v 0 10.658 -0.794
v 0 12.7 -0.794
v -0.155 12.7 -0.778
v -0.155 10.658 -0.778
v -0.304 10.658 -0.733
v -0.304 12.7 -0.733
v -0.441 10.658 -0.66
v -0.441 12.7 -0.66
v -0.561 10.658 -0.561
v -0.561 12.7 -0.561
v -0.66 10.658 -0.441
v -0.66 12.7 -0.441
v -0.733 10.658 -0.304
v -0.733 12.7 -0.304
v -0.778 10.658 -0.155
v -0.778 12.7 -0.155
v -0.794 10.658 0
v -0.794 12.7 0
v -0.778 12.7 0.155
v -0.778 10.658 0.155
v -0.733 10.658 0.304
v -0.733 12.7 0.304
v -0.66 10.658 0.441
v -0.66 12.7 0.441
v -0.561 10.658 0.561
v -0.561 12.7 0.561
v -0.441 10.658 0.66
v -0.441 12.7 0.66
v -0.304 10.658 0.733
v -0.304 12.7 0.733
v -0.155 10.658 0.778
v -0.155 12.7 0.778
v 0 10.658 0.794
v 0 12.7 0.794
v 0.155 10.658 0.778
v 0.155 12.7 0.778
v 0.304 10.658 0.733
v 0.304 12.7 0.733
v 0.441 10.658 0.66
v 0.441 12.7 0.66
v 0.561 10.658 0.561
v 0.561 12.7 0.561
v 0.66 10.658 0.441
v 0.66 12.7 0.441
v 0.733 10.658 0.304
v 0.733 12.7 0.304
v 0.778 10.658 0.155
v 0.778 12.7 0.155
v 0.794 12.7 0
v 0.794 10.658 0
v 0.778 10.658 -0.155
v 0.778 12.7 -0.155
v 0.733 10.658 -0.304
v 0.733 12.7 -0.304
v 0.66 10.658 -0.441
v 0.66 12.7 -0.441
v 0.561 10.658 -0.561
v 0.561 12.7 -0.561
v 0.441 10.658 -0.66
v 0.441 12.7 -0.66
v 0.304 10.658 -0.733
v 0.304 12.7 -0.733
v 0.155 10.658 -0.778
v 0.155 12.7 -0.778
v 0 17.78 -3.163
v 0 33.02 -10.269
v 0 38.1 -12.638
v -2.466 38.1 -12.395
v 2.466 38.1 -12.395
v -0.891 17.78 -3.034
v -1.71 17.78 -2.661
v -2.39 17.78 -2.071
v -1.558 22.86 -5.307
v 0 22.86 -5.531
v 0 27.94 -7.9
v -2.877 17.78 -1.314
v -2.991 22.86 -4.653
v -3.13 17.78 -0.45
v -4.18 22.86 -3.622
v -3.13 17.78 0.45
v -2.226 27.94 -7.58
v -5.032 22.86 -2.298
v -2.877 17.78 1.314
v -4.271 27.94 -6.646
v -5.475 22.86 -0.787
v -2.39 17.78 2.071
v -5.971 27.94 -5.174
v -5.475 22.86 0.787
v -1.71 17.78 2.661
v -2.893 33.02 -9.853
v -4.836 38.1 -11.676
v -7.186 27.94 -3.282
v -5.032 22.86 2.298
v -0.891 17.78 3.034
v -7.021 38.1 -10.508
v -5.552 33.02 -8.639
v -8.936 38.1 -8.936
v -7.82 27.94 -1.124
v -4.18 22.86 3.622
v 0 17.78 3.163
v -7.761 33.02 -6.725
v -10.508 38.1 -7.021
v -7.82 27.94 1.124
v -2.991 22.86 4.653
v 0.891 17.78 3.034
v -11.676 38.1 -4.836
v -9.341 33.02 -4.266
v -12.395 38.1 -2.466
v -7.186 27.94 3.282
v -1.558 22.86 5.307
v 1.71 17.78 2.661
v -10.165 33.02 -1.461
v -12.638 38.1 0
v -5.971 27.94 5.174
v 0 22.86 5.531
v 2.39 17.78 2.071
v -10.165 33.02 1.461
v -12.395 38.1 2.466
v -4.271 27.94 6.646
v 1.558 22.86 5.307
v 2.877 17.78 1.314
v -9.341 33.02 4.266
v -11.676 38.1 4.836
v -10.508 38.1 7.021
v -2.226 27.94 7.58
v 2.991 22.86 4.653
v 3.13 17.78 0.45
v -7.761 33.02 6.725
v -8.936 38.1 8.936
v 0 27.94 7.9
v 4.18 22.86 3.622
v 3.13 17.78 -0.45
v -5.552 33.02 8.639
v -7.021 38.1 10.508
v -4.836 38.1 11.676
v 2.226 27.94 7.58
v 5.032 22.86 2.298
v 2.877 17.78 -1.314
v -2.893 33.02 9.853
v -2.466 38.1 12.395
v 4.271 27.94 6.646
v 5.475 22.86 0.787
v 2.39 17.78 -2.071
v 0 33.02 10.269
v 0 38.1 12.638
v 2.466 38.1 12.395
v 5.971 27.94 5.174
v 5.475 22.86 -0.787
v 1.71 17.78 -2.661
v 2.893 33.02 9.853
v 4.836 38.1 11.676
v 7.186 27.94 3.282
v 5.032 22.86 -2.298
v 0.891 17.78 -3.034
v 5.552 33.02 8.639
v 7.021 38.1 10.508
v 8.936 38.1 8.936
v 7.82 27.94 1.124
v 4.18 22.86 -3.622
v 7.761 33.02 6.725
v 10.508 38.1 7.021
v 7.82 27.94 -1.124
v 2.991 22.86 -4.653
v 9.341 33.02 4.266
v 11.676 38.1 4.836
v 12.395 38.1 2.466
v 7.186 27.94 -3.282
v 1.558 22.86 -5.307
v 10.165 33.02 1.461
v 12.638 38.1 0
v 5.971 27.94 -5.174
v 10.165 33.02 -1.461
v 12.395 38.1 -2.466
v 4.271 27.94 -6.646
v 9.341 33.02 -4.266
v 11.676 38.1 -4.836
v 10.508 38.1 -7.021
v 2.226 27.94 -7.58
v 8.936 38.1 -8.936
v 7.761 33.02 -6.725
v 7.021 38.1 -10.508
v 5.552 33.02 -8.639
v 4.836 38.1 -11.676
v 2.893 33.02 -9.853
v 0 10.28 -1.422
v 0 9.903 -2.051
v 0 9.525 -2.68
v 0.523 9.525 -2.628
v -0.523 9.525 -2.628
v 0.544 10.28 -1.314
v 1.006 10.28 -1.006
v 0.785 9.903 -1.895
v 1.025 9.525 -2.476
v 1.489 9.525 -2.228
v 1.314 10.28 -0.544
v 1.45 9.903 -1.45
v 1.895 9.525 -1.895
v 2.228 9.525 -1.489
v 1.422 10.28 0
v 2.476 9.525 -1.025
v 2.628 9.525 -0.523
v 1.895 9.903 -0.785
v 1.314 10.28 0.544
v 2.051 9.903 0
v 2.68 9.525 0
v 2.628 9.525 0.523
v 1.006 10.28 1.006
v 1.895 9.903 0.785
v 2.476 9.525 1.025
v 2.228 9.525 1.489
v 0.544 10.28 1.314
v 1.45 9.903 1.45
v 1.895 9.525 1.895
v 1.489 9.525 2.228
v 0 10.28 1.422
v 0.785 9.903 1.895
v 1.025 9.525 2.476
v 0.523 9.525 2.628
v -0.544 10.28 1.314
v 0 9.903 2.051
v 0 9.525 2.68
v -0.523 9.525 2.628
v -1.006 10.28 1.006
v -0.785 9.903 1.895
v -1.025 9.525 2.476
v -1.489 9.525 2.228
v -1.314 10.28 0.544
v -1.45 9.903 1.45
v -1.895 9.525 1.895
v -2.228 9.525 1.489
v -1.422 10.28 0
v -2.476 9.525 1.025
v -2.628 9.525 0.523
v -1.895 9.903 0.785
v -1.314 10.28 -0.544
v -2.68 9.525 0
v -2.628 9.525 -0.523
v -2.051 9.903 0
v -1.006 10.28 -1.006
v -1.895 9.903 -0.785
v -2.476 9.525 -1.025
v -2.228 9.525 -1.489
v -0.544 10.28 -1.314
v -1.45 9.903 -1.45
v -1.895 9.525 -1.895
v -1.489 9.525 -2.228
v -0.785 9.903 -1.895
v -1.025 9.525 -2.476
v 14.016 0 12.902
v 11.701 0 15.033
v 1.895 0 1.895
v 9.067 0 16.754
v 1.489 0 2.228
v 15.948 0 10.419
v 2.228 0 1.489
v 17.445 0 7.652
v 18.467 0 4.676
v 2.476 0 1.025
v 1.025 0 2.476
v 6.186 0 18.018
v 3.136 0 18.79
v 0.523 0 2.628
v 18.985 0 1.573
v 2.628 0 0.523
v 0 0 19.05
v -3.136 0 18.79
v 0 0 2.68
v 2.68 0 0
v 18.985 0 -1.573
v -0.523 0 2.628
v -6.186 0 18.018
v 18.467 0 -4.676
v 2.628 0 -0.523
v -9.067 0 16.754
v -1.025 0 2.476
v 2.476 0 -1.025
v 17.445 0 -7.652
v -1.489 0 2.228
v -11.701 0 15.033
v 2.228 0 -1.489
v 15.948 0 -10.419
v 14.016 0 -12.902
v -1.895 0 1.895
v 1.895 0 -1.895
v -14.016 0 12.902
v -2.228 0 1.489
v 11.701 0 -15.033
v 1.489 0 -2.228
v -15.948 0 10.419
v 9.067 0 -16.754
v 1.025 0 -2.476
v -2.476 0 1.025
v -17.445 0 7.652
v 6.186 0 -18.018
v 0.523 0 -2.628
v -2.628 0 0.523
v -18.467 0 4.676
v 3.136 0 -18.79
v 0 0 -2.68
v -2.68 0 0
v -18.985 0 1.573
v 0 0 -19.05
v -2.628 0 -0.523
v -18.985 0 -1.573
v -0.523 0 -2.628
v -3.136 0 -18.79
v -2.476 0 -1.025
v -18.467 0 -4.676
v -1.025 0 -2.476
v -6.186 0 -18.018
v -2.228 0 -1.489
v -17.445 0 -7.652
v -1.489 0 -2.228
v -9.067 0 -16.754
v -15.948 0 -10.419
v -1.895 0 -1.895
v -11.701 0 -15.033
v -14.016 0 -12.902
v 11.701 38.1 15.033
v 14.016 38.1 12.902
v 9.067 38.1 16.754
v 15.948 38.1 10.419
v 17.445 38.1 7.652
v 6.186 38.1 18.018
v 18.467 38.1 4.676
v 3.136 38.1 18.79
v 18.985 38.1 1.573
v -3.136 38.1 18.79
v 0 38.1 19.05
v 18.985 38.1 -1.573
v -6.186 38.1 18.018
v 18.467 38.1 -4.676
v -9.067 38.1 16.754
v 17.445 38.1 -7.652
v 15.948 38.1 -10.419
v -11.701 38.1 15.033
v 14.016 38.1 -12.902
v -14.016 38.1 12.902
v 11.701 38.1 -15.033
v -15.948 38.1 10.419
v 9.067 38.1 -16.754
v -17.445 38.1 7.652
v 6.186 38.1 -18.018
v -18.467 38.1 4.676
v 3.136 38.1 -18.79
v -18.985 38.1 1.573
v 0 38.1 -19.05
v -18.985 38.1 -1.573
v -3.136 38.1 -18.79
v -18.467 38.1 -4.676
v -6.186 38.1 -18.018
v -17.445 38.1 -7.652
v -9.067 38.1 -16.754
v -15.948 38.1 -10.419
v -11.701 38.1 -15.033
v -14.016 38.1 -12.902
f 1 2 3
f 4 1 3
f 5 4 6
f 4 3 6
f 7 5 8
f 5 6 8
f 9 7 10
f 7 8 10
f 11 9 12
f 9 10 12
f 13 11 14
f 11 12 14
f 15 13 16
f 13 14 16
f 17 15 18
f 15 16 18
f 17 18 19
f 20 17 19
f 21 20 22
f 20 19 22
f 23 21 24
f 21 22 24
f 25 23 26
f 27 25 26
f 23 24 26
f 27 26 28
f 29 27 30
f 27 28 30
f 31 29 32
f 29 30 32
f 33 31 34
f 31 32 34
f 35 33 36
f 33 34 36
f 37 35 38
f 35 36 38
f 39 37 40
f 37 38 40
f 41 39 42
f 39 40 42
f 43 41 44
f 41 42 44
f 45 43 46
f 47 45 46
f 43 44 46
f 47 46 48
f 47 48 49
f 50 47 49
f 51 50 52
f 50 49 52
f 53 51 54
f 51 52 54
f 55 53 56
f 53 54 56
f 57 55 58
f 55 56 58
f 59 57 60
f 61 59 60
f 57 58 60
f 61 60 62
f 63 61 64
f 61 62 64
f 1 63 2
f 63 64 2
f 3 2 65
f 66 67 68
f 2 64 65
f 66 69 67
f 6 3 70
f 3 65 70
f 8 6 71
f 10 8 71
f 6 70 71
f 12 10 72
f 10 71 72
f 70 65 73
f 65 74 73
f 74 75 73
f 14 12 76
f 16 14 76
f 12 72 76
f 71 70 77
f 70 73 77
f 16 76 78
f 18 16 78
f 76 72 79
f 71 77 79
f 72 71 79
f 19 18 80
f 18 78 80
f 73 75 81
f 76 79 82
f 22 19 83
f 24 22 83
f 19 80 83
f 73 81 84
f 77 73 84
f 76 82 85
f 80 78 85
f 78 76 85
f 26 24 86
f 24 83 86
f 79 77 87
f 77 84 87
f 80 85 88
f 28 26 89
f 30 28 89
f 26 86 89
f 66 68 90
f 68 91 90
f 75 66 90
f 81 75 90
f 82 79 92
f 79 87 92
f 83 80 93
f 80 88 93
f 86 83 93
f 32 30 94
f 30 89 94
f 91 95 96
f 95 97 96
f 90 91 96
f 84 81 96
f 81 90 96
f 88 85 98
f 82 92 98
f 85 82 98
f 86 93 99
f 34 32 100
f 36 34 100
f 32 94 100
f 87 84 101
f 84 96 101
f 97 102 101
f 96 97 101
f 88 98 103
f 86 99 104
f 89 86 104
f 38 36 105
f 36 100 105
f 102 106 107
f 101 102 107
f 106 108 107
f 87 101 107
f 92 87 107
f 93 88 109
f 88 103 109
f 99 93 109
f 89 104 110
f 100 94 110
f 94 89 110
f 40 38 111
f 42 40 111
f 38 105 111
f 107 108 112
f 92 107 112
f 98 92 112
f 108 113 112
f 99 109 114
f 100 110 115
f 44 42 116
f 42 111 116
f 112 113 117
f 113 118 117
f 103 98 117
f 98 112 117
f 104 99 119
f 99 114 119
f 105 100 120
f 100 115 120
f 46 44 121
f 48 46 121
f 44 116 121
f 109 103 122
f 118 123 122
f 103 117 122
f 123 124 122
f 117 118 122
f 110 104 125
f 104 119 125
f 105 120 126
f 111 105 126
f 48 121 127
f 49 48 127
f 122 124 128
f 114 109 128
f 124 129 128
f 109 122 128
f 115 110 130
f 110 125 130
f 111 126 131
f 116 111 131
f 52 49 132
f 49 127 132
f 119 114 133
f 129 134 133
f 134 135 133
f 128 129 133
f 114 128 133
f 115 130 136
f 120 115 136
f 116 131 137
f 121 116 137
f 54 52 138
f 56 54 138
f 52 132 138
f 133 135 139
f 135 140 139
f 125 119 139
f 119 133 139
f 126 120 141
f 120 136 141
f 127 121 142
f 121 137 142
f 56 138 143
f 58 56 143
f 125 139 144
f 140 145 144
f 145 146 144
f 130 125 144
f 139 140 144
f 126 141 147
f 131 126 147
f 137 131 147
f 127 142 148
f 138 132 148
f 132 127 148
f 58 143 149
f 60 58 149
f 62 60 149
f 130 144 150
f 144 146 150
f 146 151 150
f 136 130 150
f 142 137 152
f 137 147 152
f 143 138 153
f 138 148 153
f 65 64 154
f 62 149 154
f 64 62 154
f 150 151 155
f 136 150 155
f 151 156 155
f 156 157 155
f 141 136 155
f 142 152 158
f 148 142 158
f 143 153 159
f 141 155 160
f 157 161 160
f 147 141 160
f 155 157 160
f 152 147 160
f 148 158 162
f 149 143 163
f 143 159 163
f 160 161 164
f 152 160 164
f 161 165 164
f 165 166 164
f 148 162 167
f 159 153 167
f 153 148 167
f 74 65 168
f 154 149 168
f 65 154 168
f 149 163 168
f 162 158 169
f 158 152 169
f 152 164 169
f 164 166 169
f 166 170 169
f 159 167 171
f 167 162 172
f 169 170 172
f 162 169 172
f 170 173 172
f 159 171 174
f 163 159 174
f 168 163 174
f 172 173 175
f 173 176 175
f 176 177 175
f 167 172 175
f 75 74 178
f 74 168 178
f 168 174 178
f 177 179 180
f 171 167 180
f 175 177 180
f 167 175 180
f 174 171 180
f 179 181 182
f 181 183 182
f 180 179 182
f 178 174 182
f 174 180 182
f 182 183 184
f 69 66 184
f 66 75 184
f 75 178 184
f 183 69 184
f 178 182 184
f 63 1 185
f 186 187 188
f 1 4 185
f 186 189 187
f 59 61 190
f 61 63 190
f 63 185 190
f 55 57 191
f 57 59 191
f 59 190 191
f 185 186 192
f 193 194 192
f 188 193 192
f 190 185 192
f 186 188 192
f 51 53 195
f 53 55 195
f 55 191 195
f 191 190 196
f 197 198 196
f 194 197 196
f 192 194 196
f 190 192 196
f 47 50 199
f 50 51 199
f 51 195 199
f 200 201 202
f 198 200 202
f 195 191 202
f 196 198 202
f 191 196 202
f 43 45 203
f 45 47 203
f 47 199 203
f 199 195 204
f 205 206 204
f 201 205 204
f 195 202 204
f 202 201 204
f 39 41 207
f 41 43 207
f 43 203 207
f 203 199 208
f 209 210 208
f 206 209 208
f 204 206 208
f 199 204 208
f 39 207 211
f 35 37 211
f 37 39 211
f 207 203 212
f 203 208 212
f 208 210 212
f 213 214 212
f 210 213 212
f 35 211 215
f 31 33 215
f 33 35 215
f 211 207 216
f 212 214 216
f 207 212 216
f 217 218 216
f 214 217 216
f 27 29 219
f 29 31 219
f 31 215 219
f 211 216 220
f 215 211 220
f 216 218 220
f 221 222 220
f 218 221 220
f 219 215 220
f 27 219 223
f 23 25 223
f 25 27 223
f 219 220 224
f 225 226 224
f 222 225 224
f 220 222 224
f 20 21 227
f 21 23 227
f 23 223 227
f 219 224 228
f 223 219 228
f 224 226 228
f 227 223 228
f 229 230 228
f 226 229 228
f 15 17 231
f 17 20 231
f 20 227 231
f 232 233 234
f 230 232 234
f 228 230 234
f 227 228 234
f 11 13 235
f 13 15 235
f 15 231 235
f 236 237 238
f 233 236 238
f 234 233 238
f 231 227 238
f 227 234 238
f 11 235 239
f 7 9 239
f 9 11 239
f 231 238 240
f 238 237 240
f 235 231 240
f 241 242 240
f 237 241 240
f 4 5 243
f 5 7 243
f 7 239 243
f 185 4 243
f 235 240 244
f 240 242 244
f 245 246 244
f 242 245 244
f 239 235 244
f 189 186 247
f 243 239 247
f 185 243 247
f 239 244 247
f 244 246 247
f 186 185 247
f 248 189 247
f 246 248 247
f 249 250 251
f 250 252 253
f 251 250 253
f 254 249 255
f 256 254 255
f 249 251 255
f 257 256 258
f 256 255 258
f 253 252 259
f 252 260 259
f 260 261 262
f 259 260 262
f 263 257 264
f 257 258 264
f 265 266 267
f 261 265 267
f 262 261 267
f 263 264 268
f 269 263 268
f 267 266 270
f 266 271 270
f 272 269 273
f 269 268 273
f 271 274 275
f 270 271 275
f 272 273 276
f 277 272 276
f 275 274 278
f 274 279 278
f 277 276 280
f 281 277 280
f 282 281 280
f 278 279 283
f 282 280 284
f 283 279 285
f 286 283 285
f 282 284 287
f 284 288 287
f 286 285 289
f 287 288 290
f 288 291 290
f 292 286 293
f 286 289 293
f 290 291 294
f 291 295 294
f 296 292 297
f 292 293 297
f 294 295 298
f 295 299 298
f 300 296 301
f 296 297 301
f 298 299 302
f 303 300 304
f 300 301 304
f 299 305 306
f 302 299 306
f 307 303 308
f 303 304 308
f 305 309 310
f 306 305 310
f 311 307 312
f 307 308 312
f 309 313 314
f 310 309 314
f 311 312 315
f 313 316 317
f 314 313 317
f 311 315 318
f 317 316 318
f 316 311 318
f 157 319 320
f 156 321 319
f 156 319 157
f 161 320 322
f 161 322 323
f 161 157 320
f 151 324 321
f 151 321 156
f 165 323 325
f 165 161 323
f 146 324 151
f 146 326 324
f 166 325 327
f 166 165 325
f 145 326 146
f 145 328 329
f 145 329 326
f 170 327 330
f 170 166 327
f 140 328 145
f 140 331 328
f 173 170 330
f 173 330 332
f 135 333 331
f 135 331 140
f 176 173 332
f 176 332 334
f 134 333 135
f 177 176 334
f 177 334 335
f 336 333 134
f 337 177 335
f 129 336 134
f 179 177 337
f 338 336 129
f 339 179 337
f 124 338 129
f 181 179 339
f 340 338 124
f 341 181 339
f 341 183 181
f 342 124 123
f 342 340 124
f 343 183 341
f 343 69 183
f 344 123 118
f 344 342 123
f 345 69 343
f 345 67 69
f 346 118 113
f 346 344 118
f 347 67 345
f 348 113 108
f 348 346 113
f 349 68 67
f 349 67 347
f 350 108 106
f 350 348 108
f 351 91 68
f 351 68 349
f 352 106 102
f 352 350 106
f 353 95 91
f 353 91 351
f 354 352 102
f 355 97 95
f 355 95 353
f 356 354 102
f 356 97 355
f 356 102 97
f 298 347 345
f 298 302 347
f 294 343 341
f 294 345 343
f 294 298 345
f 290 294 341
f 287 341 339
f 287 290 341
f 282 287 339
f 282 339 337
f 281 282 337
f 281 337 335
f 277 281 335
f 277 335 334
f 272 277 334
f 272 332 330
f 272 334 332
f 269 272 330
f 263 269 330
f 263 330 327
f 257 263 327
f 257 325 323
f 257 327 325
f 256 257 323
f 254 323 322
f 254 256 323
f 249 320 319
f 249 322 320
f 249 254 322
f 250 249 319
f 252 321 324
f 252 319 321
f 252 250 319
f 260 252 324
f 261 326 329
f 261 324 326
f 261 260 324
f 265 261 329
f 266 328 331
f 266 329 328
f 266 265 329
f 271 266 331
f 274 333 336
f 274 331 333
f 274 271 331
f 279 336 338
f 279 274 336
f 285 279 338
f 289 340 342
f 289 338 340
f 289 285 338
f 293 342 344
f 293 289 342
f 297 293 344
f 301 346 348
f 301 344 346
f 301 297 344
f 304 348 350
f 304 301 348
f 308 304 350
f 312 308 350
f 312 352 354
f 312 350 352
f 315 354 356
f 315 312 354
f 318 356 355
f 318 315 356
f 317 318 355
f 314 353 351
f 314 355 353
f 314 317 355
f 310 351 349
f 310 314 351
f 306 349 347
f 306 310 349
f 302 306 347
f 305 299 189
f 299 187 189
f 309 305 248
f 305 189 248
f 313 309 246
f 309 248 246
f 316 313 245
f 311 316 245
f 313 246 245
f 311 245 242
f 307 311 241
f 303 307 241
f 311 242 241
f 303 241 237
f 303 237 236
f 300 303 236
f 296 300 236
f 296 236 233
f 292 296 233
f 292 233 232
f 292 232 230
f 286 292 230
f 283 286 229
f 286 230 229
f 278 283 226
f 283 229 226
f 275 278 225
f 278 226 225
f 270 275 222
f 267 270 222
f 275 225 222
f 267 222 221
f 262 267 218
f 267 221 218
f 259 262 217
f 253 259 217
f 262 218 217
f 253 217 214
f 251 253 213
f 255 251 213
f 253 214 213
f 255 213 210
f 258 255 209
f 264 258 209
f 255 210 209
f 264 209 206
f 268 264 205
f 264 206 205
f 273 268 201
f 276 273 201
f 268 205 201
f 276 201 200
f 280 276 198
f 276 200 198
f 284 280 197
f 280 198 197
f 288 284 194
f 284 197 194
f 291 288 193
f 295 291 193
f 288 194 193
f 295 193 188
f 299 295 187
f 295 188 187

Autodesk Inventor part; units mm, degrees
ref_plane "YZ Plane" through (0, 0, 0) normal (1, 0, 0) x (0, 1, 0)
ref_plane "XZ Plane" through (0, 0, 0) normal (0, 1, 0) x (-1, 0, 0)
ref_plane "XY Plane" through (0, 0, 0) normal (0, 0, 1) x (1, 0, 0)
sketch "Sketch1" plane through (0, 0, 0) normal (1, 0, 0) x (0, 1, 0)
  line L0 (0, 0) -> (38.1, 0)
  line L1 (38.1, 0) -> (38.1, -19.05)
  line L2 (38.1, -19.05) -> (0, -19.05)
  line L3 (0, -19.05) -> (0, 0)
  line L4 (0, 0) -> (0, -0.7937)
  line L5 (0, -0.7937) -> (12.7, -0.7937)
  line L6 (12.7, -0.7937) -> (38.1, -12.638) construction
  line L7 (38.1, -12.638) -> (38.1, 0)
  line L8 (0, 0) -> (0, -0.7937)
  line L9 (12.7, -0.7937) -> (38.1, -12.638)
  line L10 (12.7, -0.7937) -> (40.7258, -0.7937) construction
  line L11 (0, -19.05) -> (5.8372, -13.2128)
  line L12 (0, -19.05) -> (8.255, -19.05) construction
  point P0 (8.255, 8.255)
  dimension "partH" = 38.1
  dimension "partR" = 19.05
  dimension "tubeID" = 0.7937
  dimension "straightDepth" = 12.7
  dimension "funnelTaperAngle" = 155
  dimension "taperAngle" = 25
  dimension "d15" = 8.255
  dimension "d16" = 45
revolve "Revolution1" add sketch "Sketch1" angle 360 about axis through (0, 0, 0) along (0, 1, 0) contours L5 L9 L1 L2 L3
sketch "Sketch2" plane through (0, 0, 0) normal (0, -1, 0) x (1, 0, 0)
  point P0 (0, 0)
  point P1 (0, 0)
hole "Hole1" at (0, 0, 0) direction (0, 1, 0) diameter 5.3594 depth 9.525 tip angle 118 thread size "1/4-28 UNF" class "2B" standard "ANSI Unified Screw Threads"
sketch "Sketch3" plane through (0, 0, 0) normal (0, -1, 0) x (1, 0, 0)
  circle A0 centre (0, 0) radius 0.7937 projected
  line L0 (0, 0) -> (0, -19.05)
  circle A1 centre (0, 0) radius 19.05 projected
ref_plane "Work Plane1" through (0, 0, 0) normal (-1, 0, 0) x (0, 0, -1)
sketch "Sketch4" plane through (0, 0, 0) normal (-1, 0, 0) x (0, 0, -1)
  line L0 (19.05, 0) -> (-19.05, 0) projected
  line L1 (-19.05, 0) -> (-11.8658, -7.1842)
  line L2 (-19.05, 0) -> (-8.89, 0) construction
  line L3 (19.05, 0) -> (11.8658, -7.1842)
  line L4 (19.05, 0) -> (29.21, 0) construction
  point P0 (0, 0)
  dimension "d18" = 10.16
  dimension "d19" = 45
  dimension "d20" = 10.16
  dimension "d21" = 135
properties part number "ptfe_catch_no_mount"
